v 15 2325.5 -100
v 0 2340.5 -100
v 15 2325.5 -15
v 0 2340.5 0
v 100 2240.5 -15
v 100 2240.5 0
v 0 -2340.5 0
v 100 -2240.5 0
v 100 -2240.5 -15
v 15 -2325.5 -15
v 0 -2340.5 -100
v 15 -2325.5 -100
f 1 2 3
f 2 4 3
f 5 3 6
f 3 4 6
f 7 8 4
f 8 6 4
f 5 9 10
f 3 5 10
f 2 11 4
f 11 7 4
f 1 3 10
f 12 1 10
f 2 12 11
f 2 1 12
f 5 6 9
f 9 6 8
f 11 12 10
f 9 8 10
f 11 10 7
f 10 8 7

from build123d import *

# Parameters (mm, degrees)
F1_DEPTH = 15
F3_DEPTH = 85


with BuildPart() as f1:
    # F0 (on Top) → F1 (new body)
    with BuildSketch(Plane.XY):
        Polygon((-100, -2240.5), (0, -2340.5), (0, 2340.5), (-100, 2240.5), align=None)
    extrude(amount=F1_DEPTH)

    # F2 (on face) → F3 (join)
    with BuildSketch(Plane.XY.offset(15)):
        Polygon((-15, -2325.5), (0, -2340.5), (0, 2340.5), (-15, 2325.5), align=None)
    extrude(amount=F3_DEPTH)


with BuildPart() as f4_1:
    # F4: instance of F1
    add(f1.part.mirror(Plane.XY))


with BuildPart() as f6_1:
    # F6: instance of F4_1
    add(f4_1.part.mirror(Plane.YZ))


solid = f6_1.part
